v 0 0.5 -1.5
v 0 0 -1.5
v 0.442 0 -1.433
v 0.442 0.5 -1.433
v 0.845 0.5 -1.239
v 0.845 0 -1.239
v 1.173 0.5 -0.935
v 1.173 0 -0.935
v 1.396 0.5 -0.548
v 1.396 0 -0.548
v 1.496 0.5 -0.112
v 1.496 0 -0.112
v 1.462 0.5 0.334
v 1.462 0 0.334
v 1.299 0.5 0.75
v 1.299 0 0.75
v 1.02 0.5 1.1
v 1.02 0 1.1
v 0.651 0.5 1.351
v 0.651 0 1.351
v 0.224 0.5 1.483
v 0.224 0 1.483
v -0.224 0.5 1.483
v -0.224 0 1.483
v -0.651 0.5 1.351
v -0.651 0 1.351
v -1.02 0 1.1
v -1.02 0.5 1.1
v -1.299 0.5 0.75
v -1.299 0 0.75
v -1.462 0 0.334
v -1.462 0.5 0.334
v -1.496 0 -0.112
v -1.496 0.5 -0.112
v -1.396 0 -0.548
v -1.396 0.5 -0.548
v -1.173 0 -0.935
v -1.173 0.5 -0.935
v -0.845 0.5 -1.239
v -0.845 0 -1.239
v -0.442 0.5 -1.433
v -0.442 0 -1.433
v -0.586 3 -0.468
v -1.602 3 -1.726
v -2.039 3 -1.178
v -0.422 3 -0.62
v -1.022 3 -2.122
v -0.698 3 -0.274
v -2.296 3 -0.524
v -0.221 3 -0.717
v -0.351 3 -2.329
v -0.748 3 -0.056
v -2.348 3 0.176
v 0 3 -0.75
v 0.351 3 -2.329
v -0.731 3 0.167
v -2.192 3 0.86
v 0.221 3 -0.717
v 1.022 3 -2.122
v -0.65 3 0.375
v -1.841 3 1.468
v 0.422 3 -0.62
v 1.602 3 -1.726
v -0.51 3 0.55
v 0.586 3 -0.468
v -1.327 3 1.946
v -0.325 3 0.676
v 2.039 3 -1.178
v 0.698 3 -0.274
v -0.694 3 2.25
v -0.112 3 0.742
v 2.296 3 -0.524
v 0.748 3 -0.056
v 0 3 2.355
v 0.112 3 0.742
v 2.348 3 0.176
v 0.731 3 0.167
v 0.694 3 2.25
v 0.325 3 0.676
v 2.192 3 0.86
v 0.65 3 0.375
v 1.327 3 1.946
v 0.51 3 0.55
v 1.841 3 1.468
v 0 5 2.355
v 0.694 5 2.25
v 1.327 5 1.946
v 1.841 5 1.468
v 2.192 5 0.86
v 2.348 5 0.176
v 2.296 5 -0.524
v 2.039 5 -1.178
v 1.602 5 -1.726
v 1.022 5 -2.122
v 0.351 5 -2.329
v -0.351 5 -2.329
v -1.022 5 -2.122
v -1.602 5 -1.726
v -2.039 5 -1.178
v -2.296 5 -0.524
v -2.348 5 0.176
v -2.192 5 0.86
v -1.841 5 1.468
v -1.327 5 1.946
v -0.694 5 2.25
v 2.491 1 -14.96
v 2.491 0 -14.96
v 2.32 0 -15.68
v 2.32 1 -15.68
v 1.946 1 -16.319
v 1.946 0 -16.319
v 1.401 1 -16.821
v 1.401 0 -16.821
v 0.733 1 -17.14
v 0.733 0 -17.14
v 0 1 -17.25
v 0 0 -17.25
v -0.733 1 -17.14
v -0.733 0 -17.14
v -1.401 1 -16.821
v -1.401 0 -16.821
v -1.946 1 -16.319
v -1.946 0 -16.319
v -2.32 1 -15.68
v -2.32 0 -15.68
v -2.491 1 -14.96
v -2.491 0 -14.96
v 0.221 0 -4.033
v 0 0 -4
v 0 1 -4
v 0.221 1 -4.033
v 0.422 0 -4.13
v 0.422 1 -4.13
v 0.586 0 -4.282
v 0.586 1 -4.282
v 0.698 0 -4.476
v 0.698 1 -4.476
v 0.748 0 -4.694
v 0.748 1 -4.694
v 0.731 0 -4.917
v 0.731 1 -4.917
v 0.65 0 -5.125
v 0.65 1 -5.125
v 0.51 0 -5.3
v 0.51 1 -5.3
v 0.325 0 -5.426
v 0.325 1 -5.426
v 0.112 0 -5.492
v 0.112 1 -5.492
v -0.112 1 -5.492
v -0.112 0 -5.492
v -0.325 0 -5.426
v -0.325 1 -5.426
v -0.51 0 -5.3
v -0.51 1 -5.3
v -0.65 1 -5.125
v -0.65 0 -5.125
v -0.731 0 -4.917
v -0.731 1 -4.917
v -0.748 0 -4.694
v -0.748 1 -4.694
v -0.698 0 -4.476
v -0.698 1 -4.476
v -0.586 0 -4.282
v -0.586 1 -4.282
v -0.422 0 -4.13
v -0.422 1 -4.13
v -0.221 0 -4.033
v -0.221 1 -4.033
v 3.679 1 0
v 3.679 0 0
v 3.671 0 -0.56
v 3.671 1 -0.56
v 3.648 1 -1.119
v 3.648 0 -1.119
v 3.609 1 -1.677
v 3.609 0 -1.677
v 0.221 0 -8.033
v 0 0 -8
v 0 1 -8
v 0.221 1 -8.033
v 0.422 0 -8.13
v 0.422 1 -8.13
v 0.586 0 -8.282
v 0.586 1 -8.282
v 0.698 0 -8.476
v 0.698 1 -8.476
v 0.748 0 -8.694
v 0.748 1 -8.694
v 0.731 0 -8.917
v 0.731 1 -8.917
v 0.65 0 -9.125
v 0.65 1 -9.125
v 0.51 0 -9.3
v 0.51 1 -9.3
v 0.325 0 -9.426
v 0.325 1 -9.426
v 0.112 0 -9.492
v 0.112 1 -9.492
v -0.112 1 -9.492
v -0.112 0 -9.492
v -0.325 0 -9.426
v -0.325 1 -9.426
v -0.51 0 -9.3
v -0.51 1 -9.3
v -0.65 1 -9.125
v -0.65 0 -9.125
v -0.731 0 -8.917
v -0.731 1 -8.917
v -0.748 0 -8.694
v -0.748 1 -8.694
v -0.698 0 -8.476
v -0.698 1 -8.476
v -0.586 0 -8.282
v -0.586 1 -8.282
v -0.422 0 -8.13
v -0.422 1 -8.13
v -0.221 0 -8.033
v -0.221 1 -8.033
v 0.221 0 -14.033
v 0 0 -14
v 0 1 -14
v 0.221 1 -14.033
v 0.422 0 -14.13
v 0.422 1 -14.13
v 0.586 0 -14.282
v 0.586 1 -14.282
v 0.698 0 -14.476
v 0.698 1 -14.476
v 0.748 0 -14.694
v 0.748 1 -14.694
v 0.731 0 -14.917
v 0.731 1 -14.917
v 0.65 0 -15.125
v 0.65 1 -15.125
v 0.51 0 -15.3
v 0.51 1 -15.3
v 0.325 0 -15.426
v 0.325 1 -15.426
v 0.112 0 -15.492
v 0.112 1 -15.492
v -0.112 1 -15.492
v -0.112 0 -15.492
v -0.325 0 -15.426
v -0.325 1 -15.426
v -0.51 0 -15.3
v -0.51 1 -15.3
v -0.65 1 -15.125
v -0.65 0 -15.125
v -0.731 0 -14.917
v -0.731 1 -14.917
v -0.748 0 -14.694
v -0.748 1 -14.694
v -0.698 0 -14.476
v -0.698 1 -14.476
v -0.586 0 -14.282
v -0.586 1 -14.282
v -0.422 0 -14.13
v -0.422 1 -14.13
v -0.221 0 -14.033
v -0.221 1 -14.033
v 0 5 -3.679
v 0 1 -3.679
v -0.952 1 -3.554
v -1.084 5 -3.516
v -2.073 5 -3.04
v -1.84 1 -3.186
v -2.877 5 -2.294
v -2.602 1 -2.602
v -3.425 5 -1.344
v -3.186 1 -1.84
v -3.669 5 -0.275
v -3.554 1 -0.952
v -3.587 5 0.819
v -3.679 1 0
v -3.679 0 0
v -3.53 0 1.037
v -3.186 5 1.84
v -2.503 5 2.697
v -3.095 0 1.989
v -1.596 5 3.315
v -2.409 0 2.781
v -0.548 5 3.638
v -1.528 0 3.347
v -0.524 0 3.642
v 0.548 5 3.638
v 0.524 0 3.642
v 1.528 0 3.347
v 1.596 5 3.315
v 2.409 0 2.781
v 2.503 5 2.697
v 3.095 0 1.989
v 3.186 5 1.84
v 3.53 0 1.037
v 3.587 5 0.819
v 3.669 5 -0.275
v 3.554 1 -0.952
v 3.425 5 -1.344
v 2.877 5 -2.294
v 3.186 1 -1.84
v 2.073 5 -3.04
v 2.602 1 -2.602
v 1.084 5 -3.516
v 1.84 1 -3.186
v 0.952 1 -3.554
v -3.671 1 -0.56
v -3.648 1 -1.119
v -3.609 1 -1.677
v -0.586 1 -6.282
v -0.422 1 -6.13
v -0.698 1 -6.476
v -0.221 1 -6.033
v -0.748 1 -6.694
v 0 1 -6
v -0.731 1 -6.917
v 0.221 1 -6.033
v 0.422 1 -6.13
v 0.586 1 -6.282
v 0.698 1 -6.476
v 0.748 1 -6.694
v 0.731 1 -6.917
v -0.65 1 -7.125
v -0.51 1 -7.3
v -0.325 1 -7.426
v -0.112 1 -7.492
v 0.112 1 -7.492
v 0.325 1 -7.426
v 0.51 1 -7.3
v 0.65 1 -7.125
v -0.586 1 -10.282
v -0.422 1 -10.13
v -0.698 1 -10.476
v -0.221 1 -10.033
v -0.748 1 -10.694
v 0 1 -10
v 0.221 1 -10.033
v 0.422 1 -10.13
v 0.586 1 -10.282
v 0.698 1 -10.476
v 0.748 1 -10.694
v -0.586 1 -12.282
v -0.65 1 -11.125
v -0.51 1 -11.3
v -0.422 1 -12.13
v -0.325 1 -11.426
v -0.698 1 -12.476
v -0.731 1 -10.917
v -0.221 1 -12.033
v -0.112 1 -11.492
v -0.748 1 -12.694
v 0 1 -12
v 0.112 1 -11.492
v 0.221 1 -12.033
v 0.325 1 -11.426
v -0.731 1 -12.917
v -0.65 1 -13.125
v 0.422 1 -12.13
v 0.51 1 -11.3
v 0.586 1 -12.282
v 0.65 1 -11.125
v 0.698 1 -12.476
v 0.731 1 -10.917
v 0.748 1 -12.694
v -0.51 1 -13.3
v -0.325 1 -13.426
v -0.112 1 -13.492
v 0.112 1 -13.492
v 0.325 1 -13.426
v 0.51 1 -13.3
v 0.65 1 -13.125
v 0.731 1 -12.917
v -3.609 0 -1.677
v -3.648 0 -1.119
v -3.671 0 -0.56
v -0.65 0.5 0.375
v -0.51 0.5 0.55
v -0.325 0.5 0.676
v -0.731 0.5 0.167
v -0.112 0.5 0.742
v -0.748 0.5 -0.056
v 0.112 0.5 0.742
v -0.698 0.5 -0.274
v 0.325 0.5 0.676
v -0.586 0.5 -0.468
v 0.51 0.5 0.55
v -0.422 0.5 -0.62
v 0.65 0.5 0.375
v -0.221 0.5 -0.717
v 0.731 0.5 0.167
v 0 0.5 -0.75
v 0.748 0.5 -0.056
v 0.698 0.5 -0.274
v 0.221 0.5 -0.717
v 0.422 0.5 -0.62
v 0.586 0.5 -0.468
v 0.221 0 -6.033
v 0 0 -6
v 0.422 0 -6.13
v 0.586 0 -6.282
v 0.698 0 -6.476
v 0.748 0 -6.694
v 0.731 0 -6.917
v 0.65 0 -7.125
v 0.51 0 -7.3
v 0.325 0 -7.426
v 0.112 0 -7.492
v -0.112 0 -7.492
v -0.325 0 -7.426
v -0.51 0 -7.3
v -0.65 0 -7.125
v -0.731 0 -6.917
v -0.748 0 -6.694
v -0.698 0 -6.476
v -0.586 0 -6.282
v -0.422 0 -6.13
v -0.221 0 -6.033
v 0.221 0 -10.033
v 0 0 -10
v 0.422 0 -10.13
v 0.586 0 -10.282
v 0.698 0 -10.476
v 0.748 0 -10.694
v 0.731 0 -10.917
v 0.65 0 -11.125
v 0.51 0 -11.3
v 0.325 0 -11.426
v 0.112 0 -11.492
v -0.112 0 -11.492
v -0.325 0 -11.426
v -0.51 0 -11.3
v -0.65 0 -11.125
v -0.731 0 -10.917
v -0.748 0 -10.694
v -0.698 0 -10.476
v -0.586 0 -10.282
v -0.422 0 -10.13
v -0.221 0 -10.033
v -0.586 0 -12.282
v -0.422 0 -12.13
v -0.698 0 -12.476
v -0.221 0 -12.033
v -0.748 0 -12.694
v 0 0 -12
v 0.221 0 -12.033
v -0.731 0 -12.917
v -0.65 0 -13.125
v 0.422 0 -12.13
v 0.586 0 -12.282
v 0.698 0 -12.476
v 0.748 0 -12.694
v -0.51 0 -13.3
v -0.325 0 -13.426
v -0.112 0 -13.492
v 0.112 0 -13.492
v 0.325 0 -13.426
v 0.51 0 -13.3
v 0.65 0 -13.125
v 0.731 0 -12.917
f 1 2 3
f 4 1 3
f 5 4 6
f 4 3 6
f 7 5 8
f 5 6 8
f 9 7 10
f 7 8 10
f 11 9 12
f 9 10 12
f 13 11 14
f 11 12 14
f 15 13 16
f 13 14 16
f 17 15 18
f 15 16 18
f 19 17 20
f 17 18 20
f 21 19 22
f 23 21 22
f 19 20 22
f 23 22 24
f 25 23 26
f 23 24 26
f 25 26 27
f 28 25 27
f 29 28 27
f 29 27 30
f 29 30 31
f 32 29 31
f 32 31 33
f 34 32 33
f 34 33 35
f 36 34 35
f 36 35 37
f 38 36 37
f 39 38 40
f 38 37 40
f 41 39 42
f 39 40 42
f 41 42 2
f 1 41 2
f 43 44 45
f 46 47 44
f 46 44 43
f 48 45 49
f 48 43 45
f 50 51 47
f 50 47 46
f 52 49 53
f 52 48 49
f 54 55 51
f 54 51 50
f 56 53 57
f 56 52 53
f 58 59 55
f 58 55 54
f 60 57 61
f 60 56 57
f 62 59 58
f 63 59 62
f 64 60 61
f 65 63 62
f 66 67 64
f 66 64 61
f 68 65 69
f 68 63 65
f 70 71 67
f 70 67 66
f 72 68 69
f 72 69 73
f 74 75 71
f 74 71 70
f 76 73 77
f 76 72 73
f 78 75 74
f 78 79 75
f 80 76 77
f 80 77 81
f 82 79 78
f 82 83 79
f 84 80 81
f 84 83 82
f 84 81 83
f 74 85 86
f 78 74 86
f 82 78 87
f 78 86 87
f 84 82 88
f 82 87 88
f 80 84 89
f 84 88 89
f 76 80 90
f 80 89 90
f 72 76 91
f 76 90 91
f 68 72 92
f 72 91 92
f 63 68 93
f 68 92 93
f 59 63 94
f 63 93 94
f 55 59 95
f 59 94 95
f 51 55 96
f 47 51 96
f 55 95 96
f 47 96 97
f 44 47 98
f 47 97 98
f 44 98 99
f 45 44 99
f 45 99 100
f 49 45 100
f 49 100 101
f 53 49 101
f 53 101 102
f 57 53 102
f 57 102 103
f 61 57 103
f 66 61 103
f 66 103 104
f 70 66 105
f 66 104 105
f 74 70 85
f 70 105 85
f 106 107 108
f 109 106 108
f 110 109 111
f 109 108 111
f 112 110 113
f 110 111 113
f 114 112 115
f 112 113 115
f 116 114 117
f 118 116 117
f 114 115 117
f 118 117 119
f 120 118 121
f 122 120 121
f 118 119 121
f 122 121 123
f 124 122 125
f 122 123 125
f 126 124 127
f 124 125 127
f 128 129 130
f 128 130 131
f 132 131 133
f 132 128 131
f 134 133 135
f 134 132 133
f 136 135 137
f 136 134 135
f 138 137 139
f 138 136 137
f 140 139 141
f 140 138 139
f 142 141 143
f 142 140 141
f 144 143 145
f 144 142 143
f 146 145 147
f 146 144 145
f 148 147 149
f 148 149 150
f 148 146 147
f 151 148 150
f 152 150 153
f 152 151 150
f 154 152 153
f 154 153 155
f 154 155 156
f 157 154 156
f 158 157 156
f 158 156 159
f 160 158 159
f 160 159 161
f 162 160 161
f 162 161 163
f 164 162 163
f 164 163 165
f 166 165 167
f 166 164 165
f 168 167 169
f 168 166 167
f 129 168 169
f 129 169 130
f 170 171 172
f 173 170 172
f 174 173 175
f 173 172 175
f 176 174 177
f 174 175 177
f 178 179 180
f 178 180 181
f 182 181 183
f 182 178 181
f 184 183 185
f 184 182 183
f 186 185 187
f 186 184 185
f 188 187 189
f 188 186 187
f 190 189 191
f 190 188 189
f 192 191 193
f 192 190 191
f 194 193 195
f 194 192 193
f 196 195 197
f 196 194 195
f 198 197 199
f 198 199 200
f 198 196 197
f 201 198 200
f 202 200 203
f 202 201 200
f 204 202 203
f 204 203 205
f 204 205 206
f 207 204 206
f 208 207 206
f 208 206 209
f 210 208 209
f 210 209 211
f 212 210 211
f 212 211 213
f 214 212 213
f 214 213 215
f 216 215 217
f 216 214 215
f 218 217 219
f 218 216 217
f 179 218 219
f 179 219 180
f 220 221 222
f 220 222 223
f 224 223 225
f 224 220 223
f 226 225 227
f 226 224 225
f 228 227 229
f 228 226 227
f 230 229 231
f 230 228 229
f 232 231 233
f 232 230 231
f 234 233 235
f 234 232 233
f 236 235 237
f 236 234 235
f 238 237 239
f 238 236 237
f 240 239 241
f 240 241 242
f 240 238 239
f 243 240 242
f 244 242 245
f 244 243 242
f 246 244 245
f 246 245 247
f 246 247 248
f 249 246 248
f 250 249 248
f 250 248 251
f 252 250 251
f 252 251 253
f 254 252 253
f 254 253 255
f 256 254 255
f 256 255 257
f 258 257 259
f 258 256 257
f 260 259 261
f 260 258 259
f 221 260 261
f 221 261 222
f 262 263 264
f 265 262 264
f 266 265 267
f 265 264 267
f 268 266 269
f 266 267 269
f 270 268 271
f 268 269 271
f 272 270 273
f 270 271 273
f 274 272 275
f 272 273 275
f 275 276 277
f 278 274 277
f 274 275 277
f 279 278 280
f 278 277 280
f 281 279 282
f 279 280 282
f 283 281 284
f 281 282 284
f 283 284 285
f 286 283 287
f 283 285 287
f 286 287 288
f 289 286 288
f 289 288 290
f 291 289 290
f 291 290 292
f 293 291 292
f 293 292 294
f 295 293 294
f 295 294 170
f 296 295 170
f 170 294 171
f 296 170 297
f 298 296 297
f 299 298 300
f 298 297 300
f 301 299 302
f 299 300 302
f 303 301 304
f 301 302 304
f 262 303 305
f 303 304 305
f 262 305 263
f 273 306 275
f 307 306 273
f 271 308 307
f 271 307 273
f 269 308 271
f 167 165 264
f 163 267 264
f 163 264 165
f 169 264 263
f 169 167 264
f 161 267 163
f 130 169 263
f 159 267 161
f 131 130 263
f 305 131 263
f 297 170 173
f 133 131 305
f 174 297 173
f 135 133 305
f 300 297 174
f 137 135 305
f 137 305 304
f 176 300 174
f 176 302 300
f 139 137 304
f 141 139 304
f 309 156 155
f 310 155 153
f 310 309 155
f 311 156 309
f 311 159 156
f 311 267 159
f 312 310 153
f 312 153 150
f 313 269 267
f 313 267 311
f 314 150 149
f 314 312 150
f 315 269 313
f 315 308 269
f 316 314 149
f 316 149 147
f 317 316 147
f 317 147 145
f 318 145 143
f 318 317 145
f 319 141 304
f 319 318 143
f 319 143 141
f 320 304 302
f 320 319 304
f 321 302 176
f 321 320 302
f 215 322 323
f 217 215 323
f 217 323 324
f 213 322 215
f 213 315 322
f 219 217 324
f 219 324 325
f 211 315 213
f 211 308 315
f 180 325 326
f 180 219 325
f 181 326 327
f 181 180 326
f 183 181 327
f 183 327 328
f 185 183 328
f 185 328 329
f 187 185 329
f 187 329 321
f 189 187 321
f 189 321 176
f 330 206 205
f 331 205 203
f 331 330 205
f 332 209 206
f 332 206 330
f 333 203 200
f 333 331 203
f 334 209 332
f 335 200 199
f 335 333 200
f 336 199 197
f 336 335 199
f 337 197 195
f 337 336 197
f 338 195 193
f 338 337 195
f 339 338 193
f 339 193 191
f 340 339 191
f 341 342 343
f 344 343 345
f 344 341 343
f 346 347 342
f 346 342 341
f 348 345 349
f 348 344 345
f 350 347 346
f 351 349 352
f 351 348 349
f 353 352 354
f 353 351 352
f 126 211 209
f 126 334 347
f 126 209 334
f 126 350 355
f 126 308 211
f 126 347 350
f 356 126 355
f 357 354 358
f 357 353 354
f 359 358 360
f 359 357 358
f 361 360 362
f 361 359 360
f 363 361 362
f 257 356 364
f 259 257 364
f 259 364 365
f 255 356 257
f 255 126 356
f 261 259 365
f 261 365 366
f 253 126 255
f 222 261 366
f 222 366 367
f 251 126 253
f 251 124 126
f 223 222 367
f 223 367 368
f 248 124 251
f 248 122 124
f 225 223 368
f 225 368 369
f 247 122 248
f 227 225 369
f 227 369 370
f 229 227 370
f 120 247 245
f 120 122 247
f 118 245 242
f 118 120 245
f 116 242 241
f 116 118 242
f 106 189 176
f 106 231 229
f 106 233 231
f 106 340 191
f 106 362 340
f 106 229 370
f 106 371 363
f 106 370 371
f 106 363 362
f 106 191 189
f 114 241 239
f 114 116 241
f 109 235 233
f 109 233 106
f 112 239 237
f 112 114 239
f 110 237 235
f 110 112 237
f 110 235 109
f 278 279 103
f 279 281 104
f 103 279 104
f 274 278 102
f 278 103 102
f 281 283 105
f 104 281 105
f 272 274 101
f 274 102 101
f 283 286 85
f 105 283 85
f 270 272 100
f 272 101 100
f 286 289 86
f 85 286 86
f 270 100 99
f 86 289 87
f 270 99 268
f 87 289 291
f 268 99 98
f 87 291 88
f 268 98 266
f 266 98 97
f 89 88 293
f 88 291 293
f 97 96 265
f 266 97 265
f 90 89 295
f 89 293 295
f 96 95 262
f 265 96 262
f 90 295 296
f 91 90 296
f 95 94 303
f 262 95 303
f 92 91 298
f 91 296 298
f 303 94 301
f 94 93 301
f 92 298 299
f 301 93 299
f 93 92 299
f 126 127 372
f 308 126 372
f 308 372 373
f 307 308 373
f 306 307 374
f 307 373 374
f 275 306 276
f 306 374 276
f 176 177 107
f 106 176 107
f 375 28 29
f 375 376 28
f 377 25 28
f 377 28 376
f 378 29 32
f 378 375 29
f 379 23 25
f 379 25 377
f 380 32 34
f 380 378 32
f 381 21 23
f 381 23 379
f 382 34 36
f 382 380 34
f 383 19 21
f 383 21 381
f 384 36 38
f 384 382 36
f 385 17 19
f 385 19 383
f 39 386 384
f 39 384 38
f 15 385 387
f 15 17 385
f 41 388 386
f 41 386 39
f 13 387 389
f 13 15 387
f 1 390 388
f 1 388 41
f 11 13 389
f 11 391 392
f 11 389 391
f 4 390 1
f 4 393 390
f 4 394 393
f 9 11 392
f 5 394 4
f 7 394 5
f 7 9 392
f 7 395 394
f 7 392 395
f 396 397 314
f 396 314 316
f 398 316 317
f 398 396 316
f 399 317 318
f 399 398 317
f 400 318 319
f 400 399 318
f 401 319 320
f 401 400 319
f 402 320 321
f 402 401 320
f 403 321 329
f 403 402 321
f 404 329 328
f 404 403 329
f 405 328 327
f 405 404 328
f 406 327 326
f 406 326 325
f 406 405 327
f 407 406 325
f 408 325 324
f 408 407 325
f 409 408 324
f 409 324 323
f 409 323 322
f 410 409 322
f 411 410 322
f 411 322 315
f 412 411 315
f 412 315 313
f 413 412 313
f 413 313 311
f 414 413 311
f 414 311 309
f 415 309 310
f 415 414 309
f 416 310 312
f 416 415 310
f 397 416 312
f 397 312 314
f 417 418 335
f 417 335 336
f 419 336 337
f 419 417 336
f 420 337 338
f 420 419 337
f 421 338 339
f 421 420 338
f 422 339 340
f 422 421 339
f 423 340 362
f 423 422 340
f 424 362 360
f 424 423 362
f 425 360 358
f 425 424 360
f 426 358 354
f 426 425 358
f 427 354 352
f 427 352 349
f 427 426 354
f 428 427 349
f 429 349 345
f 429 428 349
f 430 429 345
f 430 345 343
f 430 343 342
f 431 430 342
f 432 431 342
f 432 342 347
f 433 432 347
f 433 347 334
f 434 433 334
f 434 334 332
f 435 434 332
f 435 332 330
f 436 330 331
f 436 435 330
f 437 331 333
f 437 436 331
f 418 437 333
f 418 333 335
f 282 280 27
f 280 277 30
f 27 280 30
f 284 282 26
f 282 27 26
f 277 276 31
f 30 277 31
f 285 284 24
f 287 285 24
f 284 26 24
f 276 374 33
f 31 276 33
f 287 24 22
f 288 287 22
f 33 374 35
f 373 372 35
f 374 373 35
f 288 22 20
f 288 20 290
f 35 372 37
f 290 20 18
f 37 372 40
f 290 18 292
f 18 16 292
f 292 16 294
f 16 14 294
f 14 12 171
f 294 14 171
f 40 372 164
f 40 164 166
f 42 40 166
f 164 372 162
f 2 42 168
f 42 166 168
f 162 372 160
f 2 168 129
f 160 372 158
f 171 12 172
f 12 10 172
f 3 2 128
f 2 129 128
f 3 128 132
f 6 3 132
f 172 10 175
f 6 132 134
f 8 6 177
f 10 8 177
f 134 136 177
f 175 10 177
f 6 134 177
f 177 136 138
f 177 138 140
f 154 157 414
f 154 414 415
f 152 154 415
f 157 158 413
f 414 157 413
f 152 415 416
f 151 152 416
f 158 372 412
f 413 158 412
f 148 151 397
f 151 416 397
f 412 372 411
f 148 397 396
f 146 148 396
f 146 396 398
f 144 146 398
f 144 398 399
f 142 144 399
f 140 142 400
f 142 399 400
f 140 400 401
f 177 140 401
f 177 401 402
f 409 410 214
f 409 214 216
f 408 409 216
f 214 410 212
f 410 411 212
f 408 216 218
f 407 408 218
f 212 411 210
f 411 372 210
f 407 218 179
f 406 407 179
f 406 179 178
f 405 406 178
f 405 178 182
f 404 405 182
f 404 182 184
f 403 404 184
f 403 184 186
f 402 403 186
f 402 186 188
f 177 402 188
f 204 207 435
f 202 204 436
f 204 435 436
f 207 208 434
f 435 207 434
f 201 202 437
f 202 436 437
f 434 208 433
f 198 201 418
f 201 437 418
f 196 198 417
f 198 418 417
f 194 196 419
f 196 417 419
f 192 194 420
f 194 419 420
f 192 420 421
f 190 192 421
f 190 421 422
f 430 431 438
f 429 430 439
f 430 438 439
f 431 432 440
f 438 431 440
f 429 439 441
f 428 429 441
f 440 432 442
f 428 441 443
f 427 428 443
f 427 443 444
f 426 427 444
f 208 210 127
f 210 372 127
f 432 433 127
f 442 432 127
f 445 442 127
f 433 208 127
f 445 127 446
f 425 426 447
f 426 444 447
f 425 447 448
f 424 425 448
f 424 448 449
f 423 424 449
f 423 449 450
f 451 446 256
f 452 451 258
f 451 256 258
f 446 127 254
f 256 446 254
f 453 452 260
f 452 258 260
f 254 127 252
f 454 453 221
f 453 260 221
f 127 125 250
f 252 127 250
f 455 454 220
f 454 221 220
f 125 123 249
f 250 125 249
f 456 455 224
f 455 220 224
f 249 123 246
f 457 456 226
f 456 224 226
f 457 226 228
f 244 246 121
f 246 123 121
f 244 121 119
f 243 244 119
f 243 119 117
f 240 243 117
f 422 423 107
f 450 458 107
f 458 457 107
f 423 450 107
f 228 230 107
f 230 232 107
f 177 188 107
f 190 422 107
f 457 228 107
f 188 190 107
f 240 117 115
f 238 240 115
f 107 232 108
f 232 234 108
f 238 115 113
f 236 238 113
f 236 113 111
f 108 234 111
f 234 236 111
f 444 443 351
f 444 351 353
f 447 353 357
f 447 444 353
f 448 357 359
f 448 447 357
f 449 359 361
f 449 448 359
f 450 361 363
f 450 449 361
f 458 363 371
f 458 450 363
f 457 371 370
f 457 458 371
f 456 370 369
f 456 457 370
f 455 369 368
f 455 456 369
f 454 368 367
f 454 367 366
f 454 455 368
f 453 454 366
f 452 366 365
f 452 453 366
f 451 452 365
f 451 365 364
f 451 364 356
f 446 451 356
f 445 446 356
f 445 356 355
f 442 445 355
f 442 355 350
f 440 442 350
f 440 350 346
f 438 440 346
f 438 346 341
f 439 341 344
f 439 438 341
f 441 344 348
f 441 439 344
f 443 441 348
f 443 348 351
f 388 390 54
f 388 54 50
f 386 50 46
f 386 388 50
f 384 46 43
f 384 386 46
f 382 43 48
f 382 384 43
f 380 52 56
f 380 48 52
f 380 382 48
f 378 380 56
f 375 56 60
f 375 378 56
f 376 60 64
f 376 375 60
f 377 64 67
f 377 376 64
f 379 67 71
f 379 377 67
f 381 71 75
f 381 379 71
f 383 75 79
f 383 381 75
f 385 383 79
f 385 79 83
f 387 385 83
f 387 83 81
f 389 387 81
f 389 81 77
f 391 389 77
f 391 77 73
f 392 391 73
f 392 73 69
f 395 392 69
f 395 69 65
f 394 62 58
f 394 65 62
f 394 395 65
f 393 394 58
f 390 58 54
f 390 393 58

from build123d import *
from build123d.topology import SkipClean

# Parameters (mm, degrees)
SKETCH1_R           = 0.75
BOSS_EXTRUDE1_DEPTH = 1
SKETCH2_R           = 3.67931812
BOSS_EXTRUDE2_DEPTH = 5
SKETCH2_3_R         = 1.5
CUT_EXTRUDE1_DEPTH  = 0.5
SKETCH1_2_R         = 0.75
CUT_EXTRUDE2_DEPTH  = 19.333027078
SKETCH3_R           = 2.355
CUT_EXTRUDE3_DEPTH  = 2


with BuildPart() as part:
    # Sketch1 → Boss-Extrude1 (new body)
    with BuildSketch(Plane(origin=(0, 0, 0), x_dir=(1, 0, 0), z_dir=(0, 1, 0))):
        with BuildLine():
            ThreePointArc((2.49119588, 14.959626071), (0, 17.25), (-2.49119588, 14.959626071))
            Line((-2.49119588, 14.959626071), (-3.608885156, 1.677008569))
            ThreePointArc((-3.608885156, 1.677008569), (-3.66170212, 0.839243514), (-3.67931812, 4.9e-08))
            ThreePointArc((-3.67931812, 4.9e-08), (-2.4e-08, -3.67931812), (3.67931812, 0))
            ThreePointArc((3.67931812, 0), (3.661702121, 0.83924349), (3.608885156, 1.677008569))
            Line((3.608885156, 1.677008569), (2.49119588, 14.959626071))
        make_face()
        with Locations((0, 4.75)):
            Circle(SKETCH1_R, mode=Mode.SUBTRACT)
        with Locations((0, 6.75)):
            Circle(SKETCH1_R, mode=Mode.SUBTRACT)
        with Locations((0, 8.75)):
            Circle(SKETCH1_R, mode=Mode.SUBTRACT)
        with Locations((0, 10.75)):
            Circle(SKETCH1_R, mode=Mode.SUBTRACT)
        with Locations((0, 12.75)):
            Circle(SKETCH1_R, mode=Mode.SUBTRACT)
        with Locations((0, 14.75)):
            Circle(SKETCH1_R, mode=Mode.SUBTRACT)
        Circle(SKETCH1_R, mode=Mode.SUBTRACT)
    extrude(amount=BOSS_EXTRUDE1_DEPTH)

    # Sketch2 → Boss-Extrude2 (add)
    with SkipClean():  # the faces are left unmerged after this step: merging them gives an invalid solid
        with BuildSketch(Plane.XZ):
            Circle(SKETCH2_R)
        extrude(amount=-BOSS_EXTRUDE2_DEPTH)

    # Sketch2<3> → Cut-Extrude1 (cut)
    with SkipClean():  # the faces are left unmerged after this step: merging them gives an invalid solid
        with BuildSketch(Plane.XZ):
            Circle(SKETCH2_3_R)
        extrude(amount=-CUT_EXTRUDE1_DEPTH, mode=Mode.SUBTRACT)

    # Sketch1<2> → Cut-Extrude2 (cut, through all)
    with SkipClean():  # the faces are left unmerged after this step: merging them gives an invalid solid
        with BuildSketch(Plane(origin=(0, 0, 0), x_dir=(1, 0, 0), z_dir=(0, 1, 0))):
            Circle(SKETCH1_2_R)
        extrude(amount=CUT_EXTRUDE2_DEPTH, mode=Mode.SUBTRACT)

    # Sketch3 → Cut-Extrude3 (cut)
    with SkipClean():  # the faces are left unmerged after this step: merging them gives an invalid solid
        with BuildSketch(Plane(origin=(0, 5, 0), x_dir=(1, 0, 0), z_dir=(0, 1, 0))):
            Circle(SKETCH3_R)
        extrude(amount=-CUT_EXTRUDE3_DEPTH, mode=Mode.SUBTRACT)


solid = part.part
